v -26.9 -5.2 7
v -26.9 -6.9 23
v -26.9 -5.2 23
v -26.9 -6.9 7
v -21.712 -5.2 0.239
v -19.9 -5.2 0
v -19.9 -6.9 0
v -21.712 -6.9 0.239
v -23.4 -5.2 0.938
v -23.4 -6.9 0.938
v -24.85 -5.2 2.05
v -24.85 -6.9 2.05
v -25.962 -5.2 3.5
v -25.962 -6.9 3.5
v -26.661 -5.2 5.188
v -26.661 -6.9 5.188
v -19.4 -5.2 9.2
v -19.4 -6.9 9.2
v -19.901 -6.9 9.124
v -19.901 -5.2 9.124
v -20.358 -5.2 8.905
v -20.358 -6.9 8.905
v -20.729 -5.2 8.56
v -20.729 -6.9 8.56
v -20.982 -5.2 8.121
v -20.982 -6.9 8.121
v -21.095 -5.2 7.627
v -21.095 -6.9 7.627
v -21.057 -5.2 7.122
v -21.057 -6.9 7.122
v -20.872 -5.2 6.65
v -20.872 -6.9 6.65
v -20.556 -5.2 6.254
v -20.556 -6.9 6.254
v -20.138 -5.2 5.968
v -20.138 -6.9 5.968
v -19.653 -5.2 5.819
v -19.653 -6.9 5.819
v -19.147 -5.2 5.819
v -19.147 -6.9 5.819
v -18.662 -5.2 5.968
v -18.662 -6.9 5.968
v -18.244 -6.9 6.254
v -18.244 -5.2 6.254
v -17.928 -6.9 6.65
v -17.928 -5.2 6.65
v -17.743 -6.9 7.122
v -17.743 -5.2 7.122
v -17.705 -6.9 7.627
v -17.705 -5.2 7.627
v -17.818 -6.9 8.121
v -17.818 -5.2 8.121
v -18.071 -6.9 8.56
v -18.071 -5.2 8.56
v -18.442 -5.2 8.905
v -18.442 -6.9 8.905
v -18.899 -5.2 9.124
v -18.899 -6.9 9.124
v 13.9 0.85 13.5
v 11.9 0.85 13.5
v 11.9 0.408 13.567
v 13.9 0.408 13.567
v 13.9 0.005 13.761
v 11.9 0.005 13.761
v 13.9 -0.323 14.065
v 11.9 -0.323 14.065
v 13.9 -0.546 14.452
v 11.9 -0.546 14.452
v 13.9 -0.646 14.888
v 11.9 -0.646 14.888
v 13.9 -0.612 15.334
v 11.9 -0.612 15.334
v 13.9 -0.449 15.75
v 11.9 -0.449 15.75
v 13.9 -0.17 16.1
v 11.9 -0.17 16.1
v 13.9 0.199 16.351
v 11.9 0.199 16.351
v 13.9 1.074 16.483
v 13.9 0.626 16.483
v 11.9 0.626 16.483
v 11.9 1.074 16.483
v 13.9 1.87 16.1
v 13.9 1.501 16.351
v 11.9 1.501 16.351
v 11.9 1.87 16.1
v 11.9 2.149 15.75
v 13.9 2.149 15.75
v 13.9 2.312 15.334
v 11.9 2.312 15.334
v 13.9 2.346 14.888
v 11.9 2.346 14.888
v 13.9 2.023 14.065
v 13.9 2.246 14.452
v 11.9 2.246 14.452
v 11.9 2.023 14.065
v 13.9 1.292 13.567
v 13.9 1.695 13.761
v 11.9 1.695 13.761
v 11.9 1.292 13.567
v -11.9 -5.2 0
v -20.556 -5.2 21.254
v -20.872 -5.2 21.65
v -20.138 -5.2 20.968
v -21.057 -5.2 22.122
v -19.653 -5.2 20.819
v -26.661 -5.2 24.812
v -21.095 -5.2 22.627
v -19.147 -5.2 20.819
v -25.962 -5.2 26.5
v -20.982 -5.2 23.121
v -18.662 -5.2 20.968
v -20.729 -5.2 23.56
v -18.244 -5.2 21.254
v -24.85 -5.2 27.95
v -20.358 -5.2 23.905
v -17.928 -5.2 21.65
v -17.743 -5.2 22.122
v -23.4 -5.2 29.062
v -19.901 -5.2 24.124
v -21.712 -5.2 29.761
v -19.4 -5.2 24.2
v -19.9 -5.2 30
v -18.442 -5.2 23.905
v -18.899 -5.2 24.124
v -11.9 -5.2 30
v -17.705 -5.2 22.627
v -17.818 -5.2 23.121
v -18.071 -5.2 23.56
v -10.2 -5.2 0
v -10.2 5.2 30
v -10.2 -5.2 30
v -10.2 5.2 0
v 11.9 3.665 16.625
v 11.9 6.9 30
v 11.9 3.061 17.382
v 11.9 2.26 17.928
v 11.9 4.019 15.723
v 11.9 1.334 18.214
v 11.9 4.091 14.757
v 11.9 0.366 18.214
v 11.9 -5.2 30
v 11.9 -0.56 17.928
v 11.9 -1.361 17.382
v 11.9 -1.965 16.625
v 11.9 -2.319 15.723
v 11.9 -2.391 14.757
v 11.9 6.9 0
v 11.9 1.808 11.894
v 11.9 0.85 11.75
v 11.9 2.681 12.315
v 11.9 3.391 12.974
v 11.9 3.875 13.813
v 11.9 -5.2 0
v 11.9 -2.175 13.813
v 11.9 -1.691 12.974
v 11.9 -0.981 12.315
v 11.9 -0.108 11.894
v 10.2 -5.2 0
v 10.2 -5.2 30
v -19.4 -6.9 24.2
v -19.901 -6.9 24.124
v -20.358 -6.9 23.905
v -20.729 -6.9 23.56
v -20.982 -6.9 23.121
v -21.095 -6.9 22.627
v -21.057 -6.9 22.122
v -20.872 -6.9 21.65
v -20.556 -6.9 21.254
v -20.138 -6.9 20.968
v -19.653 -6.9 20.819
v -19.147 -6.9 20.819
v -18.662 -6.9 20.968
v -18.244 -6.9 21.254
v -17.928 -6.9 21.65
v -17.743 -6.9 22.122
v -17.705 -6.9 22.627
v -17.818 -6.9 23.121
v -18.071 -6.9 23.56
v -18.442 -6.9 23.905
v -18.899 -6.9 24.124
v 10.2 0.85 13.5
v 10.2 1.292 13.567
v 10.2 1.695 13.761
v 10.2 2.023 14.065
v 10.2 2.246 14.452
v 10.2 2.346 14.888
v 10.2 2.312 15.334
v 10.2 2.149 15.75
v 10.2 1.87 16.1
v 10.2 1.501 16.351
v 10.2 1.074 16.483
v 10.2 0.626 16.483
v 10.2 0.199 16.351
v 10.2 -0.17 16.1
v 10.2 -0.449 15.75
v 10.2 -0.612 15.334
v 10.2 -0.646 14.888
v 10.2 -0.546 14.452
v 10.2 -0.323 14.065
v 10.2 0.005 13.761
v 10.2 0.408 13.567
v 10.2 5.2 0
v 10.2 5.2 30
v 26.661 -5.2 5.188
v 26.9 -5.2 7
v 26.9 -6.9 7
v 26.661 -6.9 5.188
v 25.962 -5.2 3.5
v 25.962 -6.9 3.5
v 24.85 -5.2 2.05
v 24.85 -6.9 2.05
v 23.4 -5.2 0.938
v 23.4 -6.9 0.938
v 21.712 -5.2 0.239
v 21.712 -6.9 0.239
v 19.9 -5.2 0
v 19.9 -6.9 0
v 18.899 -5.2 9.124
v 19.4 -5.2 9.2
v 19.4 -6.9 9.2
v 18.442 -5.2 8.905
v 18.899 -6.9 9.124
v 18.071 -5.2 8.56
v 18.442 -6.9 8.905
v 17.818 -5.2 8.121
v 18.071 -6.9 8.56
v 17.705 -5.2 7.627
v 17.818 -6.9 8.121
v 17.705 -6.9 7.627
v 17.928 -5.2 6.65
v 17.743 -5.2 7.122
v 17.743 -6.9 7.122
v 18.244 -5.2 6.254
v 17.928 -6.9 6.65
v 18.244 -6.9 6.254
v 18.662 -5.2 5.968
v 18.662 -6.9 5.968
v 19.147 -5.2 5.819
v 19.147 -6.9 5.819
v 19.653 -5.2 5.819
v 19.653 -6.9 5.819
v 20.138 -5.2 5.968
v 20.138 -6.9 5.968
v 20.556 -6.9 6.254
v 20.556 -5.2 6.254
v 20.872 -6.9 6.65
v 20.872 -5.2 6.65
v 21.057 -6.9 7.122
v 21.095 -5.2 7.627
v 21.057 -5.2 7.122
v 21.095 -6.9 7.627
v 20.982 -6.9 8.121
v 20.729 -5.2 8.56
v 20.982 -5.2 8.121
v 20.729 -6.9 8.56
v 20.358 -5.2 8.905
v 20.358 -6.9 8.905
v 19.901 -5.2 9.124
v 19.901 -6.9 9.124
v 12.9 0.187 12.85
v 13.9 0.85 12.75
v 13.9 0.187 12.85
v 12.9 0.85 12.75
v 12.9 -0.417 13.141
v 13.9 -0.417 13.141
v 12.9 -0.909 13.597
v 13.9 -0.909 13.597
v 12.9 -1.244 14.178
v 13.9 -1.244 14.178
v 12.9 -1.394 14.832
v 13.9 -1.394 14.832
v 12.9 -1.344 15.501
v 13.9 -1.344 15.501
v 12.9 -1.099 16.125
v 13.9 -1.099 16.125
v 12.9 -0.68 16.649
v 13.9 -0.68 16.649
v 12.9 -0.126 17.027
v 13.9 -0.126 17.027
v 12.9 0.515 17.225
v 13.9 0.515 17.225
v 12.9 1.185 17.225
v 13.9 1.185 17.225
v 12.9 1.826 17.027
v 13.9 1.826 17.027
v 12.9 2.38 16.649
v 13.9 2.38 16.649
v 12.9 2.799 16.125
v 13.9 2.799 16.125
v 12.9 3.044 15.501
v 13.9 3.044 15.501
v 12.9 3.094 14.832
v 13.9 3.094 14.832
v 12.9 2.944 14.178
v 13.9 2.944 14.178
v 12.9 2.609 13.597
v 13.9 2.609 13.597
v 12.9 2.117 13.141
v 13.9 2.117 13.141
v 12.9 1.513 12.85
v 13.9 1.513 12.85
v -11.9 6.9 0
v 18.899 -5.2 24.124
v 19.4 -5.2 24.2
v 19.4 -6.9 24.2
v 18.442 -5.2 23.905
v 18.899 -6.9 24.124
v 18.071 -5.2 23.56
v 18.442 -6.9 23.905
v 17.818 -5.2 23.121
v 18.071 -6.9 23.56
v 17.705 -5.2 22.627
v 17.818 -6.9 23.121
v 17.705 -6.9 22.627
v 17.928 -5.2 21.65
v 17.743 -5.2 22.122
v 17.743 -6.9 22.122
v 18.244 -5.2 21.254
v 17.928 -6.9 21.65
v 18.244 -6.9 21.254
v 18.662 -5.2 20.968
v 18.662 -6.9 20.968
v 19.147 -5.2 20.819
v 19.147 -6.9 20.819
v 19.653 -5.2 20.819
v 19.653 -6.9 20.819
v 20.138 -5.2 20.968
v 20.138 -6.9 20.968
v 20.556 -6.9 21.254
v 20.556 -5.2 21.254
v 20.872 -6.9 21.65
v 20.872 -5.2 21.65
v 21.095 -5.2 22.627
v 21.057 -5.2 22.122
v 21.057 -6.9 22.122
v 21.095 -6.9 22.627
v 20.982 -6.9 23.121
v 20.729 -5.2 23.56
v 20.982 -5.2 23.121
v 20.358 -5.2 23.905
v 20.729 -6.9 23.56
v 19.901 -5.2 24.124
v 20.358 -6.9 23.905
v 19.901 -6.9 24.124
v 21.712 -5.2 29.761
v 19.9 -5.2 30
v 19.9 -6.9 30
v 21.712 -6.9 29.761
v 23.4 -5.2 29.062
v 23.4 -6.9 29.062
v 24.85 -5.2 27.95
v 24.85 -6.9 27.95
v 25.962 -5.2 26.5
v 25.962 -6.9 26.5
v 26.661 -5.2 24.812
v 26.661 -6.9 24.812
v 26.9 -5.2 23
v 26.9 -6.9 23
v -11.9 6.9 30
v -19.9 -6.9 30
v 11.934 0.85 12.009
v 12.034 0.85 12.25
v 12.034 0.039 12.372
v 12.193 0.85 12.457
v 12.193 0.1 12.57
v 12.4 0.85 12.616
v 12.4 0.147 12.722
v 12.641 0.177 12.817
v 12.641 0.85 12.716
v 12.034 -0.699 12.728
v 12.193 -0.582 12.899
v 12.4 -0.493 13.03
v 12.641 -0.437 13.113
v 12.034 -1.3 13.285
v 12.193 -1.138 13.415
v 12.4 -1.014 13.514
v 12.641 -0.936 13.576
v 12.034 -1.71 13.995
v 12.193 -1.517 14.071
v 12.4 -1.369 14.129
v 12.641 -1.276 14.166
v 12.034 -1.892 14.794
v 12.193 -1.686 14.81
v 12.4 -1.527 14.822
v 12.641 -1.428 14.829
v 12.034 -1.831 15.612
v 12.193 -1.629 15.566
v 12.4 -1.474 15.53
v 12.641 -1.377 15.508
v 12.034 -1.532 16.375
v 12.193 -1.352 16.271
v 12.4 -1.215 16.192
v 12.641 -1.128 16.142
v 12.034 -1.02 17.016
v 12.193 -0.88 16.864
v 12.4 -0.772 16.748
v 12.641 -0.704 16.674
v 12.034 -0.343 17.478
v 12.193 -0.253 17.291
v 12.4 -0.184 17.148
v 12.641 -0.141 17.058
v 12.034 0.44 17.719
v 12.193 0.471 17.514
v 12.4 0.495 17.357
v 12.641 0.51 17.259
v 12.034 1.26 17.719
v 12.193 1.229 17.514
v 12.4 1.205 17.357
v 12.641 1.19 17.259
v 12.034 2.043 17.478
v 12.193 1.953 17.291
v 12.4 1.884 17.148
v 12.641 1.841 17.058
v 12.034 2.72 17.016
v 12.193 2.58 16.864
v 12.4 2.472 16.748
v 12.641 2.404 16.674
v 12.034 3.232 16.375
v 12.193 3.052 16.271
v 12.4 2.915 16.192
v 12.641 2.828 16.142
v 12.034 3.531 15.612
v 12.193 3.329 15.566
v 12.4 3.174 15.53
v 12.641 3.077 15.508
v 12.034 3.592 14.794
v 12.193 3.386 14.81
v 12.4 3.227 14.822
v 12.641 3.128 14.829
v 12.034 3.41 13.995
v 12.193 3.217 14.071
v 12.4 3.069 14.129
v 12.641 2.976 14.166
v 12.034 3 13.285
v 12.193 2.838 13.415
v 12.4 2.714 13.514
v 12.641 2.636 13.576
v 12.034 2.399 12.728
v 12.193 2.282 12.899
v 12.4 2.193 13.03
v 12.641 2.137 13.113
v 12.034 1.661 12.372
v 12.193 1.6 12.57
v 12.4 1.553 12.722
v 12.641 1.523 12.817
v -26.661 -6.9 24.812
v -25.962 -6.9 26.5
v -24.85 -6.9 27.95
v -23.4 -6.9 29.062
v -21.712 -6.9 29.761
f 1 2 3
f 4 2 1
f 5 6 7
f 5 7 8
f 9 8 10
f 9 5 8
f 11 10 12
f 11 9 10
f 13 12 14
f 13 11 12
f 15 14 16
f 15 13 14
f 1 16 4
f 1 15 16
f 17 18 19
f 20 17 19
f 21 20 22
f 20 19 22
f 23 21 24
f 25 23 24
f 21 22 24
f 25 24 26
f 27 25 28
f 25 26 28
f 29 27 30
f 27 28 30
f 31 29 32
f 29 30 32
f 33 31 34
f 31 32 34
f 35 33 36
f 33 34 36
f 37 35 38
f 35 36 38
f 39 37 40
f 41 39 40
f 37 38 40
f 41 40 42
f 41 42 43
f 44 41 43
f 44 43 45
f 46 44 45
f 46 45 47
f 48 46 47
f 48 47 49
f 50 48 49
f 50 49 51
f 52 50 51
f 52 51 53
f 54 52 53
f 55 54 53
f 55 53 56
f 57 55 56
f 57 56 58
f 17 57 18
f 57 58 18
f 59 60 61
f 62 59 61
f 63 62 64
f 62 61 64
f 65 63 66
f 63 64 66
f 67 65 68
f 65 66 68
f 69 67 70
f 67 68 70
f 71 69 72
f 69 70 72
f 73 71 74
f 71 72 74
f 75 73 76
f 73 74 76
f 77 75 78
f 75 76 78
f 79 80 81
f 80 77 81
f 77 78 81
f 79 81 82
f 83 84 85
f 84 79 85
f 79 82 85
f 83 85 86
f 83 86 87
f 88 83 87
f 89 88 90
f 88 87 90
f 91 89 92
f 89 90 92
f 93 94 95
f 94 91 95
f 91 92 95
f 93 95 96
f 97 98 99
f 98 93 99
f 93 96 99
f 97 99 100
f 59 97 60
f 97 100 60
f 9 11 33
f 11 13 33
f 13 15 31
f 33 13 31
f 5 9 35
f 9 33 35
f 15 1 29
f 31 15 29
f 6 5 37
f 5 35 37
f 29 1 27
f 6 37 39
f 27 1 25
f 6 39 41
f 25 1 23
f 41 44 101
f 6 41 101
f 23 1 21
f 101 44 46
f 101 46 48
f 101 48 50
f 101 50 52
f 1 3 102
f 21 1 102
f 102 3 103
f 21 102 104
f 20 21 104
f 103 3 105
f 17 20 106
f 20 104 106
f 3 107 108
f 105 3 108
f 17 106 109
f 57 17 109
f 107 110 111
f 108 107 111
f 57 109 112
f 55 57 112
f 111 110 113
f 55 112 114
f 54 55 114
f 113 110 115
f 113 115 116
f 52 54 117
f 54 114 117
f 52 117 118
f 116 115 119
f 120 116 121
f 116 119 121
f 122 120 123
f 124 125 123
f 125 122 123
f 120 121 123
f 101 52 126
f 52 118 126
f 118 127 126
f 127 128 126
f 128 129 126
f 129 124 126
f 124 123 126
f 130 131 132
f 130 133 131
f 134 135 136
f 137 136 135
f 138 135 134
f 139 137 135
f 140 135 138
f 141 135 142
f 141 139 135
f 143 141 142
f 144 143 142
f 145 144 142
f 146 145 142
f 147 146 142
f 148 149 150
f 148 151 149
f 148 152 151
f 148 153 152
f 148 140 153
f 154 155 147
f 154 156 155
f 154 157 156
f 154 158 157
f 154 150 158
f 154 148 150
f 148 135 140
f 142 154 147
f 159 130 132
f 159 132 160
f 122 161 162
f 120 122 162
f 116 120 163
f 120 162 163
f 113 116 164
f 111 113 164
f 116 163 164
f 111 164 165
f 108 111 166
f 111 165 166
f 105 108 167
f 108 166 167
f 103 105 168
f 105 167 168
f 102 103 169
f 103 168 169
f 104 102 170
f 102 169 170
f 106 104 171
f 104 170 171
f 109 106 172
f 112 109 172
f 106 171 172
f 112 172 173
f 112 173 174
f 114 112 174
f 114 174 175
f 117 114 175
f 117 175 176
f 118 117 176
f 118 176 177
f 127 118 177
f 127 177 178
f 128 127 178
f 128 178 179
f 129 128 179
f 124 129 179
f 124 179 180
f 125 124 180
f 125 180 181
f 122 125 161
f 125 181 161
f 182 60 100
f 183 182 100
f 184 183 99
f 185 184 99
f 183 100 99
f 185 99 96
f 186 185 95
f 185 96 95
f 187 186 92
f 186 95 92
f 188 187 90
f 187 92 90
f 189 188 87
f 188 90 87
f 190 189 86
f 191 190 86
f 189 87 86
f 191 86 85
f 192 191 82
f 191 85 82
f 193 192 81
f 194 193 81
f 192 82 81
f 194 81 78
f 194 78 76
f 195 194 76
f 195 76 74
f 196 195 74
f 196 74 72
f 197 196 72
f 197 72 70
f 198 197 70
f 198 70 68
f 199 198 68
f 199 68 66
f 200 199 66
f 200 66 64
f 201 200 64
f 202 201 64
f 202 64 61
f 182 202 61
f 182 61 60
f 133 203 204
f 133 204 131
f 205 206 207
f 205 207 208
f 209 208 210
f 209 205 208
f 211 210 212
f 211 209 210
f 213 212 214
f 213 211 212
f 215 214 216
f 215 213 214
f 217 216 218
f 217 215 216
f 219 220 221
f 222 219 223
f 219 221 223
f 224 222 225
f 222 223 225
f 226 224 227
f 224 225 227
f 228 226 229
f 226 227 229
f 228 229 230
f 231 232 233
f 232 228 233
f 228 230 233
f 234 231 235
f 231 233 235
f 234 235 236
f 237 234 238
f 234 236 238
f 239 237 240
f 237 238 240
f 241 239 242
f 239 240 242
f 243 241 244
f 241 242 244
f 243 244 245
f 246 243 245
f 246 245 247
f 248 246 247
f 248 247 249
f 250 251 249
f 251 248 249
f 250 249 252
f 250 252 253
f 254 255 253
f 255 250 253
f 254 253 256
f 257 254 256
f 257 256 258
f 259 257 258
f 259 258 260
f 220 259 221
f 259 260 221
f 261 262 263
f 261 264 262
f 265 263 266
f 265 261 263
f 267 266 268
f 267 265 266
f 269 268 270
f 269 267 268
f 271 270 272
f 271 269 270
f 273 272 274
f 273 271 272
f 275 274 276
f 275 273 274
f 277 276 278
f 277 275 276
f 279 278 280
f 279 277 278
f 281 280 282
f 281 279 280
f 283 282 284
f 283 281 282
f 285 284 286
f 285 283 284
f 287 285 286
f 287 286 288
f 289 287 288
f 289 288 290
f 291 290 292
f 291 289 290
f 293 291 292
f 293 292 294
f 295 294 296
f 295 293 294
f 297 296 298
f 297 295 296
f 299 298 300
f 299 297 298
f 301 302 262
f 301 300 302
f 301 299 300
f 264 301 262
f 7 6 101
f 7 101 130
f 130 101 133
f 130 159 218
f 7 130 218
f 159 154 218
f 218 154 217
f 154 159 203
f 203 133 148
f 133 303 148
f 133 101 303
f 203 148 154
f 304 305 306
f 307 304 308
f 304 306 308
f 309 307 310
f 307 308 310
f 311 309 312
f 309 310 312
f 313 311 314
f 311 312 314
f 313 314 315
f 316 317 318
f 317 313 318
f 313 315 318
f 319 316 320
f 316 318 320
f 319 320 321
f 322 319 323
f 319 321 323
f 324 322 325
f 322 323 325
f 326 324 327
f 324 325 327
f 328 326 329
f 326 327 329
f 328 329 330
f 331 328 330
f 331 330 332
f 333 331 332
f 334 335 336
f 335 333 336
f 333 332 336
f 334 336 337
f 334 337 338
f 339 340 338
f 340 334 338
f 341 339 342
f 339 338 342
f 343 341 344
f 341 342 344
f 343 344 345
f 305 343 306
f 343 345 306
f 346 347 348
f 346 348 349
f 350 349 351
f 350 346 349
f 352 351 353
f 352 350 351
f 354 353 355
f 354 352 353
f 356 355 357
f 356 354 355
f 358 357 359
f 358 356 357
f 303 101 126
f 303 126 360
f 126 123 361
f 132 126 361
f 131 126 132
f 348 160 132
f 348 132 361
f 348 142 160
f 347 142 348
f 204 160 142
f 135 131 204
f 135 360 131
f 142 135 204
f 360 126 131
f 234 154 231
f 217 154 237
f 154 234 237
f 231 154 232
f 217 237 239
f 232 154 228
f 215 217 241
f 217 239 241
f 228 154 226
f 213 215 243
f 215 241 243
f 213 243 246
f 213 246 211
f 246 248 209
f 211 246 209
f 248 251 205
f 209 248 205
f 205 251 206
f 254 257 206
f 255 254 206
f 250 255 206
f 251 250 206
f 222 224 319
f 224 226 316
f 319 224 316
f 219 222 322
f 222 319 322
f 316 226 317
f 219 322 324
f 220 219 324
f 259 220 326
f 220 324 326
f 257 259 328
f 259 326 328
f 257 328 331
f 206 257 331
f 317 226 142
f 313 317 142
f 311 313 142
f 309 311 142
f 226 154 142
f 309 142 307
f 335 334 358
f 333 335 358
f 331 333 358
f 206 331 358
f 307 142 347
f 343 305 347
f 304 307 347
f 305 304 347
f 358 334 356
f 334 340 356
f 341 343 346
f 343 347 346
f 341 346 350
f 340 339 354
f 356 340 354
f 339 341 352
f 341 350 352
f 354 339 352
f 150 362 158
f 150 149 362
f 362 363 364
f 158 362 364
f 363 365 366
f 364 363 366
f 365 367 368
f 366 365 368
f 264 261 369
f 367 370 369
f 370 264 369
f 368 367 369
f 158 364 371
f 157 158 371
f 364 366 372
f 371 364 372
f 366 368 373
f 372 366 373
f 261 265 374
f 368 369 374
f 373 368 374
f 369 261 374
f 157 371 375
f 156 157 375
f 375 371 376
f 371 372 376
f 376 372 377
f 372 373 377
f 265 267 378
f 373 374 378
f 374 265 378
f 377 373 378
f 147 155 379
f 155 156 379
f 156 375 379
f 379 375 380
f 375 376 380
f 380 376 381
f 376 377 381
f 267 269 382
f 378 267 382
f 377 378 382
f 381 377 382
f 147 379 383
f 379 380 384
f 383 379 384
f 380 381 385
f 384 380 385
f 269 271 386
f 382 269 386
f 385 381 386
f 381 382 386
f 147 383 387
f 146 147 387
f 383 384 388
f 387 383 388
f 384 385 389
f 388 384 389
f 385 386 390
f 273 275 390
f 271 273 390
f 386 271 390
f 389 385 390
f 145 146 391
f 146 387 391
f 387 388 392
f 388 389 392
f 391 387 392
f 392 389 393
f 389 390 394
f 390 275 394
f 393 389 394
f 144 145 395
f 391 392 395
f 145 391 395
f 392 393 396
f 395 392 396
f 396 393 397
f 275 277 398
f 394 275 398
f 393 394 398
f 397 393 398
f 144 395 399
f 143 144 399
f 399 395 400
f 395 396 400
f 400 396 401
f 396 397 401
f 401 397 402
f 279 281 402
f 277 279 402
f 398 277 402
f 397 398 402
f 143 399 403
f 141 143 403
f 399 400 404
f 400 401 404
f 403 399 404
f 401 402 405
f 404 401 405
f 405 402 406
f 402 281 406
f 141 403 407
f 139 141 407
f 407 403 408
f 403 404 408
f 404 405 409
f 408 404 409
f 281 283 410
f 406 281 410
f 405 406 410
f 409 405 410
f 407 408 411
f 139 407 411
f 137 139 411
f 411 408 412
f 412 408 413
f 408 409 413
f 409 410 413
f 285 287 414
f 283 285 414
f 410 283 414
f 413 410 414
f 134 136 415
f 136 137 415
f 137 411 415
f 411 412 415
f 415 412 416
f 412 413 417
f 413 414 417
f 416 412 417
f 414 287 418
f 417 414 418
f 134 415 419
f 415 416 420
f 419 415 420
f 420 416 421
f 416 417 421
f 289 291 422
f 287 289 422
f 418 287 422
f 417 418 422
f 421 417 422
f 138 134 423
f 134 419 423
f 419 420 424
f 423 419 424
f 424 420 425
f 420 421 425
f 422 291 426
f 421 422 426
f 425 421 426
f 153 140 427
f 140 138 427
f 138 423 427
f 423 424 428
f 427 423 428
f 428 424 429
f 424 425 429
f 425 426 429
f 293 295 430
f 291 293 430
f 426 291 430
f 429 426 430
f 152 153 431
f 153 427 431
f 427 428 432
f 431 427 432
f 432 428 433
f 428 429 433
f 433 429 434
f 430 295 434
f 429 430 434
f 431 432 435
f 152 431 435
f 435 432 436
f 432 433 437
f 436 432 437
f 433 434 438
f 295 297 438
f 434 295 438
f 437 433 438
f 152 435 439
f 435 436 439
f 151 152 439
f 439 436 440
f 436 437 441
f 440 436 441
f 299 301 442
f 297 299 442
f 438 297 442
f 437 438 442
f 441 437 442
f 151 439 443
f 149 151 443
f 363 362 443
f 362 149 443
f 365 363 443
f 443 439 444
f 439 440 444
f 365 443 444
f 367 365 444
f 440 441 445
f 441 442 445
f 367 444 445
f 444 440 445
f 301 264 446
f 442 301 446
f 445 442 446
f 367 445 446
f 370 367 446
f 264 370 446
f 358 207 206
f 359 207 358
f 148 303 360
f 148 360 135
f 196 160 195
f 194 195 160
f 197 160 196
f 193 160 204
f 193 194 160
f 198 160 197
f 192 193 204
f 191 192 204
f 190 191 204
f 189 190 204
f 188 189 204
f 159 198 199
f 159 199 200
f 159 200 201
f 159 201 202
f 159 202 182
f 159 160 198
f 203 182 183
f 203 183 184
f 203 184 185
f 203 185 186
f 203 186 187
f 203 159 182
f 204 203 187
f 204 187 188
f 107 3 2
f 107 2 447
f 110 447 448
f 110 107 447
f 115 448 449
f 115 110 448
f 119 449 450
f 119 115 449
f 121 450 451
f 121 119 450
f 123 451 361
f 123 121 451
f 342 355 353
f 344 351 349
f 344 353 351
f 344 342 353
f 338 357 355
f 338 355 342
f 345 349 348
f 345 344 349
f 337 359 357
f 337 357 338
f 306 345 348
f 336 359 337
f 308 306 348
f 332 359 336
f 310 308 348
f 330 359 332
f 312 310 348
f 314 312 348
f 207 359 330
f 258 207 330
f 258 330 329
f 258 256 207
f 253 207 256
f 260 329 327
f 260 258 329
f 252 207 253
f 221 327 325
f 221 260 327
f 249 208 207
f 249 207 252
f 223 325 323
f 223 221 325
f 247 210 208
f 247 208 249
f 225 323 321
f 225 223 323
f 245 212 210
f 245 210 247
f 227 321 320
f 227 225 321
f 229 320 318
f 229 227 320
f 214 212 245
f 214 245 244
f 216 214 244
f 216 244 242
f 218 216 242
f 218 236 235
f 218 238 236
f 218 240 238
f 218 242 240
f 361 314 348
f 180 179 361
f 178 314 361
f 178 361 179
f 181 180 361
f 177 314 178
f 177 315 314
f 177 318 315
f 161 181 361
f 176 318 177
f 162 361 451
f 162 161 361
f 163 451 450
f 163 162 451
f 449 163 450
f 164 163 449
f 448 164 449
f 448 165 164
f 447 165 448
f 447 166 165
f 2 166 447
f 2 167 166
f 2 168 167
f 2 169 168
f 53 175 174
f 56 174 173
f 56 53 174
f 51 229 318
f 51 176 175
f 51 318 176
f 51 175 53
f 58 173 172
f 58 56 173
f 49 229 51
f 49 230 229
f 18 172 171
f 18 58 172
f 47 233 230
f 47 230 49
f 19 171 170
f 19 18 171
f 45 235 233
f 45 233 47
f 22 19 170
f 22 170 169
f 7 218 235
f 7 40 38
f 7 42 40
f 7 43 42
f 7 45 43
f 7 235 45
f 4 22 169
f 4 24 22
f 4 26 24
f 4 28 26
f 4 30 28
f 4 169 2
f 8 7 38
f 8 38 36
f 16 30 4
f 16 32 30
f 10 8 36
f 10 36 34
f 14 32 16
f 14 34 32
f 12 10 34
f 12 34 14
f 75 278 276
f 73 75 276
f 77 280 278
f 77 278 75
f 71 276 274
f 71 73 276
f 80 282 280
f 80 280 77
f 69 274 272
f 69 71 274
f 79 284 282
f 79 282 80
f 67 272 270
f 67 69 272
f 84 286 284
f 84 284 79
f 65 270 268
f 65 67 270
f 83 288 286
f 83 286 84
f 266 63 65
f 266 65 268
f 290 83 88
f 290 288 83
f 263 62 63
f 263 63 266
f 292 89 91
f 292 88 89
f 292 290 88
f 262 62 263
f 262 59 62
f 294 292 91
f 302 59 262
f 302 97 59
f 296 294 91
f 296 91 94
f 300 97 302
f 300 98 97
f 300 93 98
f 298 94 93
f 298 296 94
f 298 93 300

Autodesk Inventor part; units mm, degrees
ref_plane "YZ Plane" through (0, 0, 0) normal (1, 0, 0) x (0, 1, 0)
ref_plane "XZ Plane" through (0, 0, 0) normal (0, 1, 0) x (-1, 0, 0)
ref_plane "XY Plane" through (0, 0, 0) normal (0, 0, 1) x (1, 0, 0)
sketch "Sketch1" plane through (0, 0, 0) normal (0, 0, 1) x (1, 0, 0)
  line L0 (-10.2, -5.2) -> (10.2, -5.2)
  line L1 (10.2, -5.2) -> (10.2, 5.2)
  line L2 (10.2, 5.2) -> (-10.2, 5.2)
  line L3 (-10.2, 5.2) -> (-10.2, -5.2)
  line L4 (-10.2, -5.2) -> (10.2, 5.2) construction
  line L5 (10.2, -5.2) -> (-10.2, 5.2) construction
  line L6 (-11.9, 6.9) -> (11.9, 6.9)
  line L7 (11.9, 6.9) -> (11.9, -6.9)
  line L8 (11.9, -6.9) -> (-11.9, -6.9)
  line L9 (-11.9, -6.9) -> (-11.9, 6.9)
  point P0 (0, 0)
  dimension "d0" = 20.4
  dimension "d1" = 10.4
  dimension "d2" = 1.7
extrude "Extrusion1" add sketch "Sketch1" along normal blind 30
sketch "Sketch2" plane through (-11.9, -6.9, 0) normal (0, -1, 0) x (1, 0, 0)
  line L0 (-15, 0) -> (38.8, 0)
  line L1 (38.8, 0) -> (38.8, 30)
  line L2 (38.8, 30) -> (-15, 30)
  line L3 (-15, 30) -> (-15, 0)
  line L4 (-15, 0) -> (38.8, 30) construction
  line L5 (38.8, 0) -> (-15, 30) construction
  point P0 (11.9, 0)
  point P1 (11.9, 15)
  dimension "d5" = 53.8
  dimension "d23" = 30
extrude "Extrusion2" add sketch "Sketch2" against normal blind 1.7
sketch "Sketch3" plane through (-11.9, -5.2, 0) normal (0, 1, 0) x (1, 0, 0)
  line L0 (-15, 0) -> (38.8, 0) construction
  line L1 (0, 0) -> (0, -30) construction
  line L2 (-15, 0) -> (0, 0) construction
  line L3 (0, 0) -> (0, -15) construction
  line L4 (0, -15) -> (-15, -15) construction
  line L5 (-15, -15) -> (-15, 0) construction
  line L6 (-15, 0) -> (0, -15) construction
  line L7 (-15, 0) -> (-15, -30) construction
  line L8 (0, -15) -> (-15, -30) construction
  point P0 (11.9, 0)
  point P1 (-7.5, -7.5)
  point P2 (-7.5, -22.5)
  point P3 (-15, -7.5)
  point P4 (-7.5, 0)
  dimension "d24" = 7.5
  dimension "d25" = 7.5
hole "Hole1" at (-19.4, -5.2, 7.5) at (-19.4, -5.2, 22.5) direction (0, -1, 0) diameter 3.4 depth 5 tip angle 118
mirror "Mirror1" about plane through (0, 0, 0) normal (1, 0, 0) of "Hole1"
fillet "Fillet1" radius 7 4 edges at (26.9, -6.05, 30) (26.9, -6.05, 0) (-26.9, -6.05, 0) (-26.9, -6.05, 30)
sketch "Sketch4" plane through (11.9, 6.9, 30) normal (1, 0, 0) x (0, 0, -1)
  line L0 (30, 0) -> (0, 0) construction
  line L1 (30, -12.1) -> (0, -12.1) construction
  line L2 (0, 0) -> (30, -12.1) construction
  circle A0 centre (15, -6.05) radius 1.5
  circle A1 centre (15, -6.05) radius 2.25
  point P0 (30, -6.9)
  dimension "d16" = 3
  dimension "d17" = 0.75
extrude "Extrusion3" add sketch "Sketch4" along normal blind 2
fillet "Fillet2" radius 1 1 edges at (11.9, 0.85, 17.25)
extrude "Extrusion4" cut sketch "Sketch4" against normal blind 2 contours A0
properties part number "BeamHoldertoBack" material "ABS Plastic"
